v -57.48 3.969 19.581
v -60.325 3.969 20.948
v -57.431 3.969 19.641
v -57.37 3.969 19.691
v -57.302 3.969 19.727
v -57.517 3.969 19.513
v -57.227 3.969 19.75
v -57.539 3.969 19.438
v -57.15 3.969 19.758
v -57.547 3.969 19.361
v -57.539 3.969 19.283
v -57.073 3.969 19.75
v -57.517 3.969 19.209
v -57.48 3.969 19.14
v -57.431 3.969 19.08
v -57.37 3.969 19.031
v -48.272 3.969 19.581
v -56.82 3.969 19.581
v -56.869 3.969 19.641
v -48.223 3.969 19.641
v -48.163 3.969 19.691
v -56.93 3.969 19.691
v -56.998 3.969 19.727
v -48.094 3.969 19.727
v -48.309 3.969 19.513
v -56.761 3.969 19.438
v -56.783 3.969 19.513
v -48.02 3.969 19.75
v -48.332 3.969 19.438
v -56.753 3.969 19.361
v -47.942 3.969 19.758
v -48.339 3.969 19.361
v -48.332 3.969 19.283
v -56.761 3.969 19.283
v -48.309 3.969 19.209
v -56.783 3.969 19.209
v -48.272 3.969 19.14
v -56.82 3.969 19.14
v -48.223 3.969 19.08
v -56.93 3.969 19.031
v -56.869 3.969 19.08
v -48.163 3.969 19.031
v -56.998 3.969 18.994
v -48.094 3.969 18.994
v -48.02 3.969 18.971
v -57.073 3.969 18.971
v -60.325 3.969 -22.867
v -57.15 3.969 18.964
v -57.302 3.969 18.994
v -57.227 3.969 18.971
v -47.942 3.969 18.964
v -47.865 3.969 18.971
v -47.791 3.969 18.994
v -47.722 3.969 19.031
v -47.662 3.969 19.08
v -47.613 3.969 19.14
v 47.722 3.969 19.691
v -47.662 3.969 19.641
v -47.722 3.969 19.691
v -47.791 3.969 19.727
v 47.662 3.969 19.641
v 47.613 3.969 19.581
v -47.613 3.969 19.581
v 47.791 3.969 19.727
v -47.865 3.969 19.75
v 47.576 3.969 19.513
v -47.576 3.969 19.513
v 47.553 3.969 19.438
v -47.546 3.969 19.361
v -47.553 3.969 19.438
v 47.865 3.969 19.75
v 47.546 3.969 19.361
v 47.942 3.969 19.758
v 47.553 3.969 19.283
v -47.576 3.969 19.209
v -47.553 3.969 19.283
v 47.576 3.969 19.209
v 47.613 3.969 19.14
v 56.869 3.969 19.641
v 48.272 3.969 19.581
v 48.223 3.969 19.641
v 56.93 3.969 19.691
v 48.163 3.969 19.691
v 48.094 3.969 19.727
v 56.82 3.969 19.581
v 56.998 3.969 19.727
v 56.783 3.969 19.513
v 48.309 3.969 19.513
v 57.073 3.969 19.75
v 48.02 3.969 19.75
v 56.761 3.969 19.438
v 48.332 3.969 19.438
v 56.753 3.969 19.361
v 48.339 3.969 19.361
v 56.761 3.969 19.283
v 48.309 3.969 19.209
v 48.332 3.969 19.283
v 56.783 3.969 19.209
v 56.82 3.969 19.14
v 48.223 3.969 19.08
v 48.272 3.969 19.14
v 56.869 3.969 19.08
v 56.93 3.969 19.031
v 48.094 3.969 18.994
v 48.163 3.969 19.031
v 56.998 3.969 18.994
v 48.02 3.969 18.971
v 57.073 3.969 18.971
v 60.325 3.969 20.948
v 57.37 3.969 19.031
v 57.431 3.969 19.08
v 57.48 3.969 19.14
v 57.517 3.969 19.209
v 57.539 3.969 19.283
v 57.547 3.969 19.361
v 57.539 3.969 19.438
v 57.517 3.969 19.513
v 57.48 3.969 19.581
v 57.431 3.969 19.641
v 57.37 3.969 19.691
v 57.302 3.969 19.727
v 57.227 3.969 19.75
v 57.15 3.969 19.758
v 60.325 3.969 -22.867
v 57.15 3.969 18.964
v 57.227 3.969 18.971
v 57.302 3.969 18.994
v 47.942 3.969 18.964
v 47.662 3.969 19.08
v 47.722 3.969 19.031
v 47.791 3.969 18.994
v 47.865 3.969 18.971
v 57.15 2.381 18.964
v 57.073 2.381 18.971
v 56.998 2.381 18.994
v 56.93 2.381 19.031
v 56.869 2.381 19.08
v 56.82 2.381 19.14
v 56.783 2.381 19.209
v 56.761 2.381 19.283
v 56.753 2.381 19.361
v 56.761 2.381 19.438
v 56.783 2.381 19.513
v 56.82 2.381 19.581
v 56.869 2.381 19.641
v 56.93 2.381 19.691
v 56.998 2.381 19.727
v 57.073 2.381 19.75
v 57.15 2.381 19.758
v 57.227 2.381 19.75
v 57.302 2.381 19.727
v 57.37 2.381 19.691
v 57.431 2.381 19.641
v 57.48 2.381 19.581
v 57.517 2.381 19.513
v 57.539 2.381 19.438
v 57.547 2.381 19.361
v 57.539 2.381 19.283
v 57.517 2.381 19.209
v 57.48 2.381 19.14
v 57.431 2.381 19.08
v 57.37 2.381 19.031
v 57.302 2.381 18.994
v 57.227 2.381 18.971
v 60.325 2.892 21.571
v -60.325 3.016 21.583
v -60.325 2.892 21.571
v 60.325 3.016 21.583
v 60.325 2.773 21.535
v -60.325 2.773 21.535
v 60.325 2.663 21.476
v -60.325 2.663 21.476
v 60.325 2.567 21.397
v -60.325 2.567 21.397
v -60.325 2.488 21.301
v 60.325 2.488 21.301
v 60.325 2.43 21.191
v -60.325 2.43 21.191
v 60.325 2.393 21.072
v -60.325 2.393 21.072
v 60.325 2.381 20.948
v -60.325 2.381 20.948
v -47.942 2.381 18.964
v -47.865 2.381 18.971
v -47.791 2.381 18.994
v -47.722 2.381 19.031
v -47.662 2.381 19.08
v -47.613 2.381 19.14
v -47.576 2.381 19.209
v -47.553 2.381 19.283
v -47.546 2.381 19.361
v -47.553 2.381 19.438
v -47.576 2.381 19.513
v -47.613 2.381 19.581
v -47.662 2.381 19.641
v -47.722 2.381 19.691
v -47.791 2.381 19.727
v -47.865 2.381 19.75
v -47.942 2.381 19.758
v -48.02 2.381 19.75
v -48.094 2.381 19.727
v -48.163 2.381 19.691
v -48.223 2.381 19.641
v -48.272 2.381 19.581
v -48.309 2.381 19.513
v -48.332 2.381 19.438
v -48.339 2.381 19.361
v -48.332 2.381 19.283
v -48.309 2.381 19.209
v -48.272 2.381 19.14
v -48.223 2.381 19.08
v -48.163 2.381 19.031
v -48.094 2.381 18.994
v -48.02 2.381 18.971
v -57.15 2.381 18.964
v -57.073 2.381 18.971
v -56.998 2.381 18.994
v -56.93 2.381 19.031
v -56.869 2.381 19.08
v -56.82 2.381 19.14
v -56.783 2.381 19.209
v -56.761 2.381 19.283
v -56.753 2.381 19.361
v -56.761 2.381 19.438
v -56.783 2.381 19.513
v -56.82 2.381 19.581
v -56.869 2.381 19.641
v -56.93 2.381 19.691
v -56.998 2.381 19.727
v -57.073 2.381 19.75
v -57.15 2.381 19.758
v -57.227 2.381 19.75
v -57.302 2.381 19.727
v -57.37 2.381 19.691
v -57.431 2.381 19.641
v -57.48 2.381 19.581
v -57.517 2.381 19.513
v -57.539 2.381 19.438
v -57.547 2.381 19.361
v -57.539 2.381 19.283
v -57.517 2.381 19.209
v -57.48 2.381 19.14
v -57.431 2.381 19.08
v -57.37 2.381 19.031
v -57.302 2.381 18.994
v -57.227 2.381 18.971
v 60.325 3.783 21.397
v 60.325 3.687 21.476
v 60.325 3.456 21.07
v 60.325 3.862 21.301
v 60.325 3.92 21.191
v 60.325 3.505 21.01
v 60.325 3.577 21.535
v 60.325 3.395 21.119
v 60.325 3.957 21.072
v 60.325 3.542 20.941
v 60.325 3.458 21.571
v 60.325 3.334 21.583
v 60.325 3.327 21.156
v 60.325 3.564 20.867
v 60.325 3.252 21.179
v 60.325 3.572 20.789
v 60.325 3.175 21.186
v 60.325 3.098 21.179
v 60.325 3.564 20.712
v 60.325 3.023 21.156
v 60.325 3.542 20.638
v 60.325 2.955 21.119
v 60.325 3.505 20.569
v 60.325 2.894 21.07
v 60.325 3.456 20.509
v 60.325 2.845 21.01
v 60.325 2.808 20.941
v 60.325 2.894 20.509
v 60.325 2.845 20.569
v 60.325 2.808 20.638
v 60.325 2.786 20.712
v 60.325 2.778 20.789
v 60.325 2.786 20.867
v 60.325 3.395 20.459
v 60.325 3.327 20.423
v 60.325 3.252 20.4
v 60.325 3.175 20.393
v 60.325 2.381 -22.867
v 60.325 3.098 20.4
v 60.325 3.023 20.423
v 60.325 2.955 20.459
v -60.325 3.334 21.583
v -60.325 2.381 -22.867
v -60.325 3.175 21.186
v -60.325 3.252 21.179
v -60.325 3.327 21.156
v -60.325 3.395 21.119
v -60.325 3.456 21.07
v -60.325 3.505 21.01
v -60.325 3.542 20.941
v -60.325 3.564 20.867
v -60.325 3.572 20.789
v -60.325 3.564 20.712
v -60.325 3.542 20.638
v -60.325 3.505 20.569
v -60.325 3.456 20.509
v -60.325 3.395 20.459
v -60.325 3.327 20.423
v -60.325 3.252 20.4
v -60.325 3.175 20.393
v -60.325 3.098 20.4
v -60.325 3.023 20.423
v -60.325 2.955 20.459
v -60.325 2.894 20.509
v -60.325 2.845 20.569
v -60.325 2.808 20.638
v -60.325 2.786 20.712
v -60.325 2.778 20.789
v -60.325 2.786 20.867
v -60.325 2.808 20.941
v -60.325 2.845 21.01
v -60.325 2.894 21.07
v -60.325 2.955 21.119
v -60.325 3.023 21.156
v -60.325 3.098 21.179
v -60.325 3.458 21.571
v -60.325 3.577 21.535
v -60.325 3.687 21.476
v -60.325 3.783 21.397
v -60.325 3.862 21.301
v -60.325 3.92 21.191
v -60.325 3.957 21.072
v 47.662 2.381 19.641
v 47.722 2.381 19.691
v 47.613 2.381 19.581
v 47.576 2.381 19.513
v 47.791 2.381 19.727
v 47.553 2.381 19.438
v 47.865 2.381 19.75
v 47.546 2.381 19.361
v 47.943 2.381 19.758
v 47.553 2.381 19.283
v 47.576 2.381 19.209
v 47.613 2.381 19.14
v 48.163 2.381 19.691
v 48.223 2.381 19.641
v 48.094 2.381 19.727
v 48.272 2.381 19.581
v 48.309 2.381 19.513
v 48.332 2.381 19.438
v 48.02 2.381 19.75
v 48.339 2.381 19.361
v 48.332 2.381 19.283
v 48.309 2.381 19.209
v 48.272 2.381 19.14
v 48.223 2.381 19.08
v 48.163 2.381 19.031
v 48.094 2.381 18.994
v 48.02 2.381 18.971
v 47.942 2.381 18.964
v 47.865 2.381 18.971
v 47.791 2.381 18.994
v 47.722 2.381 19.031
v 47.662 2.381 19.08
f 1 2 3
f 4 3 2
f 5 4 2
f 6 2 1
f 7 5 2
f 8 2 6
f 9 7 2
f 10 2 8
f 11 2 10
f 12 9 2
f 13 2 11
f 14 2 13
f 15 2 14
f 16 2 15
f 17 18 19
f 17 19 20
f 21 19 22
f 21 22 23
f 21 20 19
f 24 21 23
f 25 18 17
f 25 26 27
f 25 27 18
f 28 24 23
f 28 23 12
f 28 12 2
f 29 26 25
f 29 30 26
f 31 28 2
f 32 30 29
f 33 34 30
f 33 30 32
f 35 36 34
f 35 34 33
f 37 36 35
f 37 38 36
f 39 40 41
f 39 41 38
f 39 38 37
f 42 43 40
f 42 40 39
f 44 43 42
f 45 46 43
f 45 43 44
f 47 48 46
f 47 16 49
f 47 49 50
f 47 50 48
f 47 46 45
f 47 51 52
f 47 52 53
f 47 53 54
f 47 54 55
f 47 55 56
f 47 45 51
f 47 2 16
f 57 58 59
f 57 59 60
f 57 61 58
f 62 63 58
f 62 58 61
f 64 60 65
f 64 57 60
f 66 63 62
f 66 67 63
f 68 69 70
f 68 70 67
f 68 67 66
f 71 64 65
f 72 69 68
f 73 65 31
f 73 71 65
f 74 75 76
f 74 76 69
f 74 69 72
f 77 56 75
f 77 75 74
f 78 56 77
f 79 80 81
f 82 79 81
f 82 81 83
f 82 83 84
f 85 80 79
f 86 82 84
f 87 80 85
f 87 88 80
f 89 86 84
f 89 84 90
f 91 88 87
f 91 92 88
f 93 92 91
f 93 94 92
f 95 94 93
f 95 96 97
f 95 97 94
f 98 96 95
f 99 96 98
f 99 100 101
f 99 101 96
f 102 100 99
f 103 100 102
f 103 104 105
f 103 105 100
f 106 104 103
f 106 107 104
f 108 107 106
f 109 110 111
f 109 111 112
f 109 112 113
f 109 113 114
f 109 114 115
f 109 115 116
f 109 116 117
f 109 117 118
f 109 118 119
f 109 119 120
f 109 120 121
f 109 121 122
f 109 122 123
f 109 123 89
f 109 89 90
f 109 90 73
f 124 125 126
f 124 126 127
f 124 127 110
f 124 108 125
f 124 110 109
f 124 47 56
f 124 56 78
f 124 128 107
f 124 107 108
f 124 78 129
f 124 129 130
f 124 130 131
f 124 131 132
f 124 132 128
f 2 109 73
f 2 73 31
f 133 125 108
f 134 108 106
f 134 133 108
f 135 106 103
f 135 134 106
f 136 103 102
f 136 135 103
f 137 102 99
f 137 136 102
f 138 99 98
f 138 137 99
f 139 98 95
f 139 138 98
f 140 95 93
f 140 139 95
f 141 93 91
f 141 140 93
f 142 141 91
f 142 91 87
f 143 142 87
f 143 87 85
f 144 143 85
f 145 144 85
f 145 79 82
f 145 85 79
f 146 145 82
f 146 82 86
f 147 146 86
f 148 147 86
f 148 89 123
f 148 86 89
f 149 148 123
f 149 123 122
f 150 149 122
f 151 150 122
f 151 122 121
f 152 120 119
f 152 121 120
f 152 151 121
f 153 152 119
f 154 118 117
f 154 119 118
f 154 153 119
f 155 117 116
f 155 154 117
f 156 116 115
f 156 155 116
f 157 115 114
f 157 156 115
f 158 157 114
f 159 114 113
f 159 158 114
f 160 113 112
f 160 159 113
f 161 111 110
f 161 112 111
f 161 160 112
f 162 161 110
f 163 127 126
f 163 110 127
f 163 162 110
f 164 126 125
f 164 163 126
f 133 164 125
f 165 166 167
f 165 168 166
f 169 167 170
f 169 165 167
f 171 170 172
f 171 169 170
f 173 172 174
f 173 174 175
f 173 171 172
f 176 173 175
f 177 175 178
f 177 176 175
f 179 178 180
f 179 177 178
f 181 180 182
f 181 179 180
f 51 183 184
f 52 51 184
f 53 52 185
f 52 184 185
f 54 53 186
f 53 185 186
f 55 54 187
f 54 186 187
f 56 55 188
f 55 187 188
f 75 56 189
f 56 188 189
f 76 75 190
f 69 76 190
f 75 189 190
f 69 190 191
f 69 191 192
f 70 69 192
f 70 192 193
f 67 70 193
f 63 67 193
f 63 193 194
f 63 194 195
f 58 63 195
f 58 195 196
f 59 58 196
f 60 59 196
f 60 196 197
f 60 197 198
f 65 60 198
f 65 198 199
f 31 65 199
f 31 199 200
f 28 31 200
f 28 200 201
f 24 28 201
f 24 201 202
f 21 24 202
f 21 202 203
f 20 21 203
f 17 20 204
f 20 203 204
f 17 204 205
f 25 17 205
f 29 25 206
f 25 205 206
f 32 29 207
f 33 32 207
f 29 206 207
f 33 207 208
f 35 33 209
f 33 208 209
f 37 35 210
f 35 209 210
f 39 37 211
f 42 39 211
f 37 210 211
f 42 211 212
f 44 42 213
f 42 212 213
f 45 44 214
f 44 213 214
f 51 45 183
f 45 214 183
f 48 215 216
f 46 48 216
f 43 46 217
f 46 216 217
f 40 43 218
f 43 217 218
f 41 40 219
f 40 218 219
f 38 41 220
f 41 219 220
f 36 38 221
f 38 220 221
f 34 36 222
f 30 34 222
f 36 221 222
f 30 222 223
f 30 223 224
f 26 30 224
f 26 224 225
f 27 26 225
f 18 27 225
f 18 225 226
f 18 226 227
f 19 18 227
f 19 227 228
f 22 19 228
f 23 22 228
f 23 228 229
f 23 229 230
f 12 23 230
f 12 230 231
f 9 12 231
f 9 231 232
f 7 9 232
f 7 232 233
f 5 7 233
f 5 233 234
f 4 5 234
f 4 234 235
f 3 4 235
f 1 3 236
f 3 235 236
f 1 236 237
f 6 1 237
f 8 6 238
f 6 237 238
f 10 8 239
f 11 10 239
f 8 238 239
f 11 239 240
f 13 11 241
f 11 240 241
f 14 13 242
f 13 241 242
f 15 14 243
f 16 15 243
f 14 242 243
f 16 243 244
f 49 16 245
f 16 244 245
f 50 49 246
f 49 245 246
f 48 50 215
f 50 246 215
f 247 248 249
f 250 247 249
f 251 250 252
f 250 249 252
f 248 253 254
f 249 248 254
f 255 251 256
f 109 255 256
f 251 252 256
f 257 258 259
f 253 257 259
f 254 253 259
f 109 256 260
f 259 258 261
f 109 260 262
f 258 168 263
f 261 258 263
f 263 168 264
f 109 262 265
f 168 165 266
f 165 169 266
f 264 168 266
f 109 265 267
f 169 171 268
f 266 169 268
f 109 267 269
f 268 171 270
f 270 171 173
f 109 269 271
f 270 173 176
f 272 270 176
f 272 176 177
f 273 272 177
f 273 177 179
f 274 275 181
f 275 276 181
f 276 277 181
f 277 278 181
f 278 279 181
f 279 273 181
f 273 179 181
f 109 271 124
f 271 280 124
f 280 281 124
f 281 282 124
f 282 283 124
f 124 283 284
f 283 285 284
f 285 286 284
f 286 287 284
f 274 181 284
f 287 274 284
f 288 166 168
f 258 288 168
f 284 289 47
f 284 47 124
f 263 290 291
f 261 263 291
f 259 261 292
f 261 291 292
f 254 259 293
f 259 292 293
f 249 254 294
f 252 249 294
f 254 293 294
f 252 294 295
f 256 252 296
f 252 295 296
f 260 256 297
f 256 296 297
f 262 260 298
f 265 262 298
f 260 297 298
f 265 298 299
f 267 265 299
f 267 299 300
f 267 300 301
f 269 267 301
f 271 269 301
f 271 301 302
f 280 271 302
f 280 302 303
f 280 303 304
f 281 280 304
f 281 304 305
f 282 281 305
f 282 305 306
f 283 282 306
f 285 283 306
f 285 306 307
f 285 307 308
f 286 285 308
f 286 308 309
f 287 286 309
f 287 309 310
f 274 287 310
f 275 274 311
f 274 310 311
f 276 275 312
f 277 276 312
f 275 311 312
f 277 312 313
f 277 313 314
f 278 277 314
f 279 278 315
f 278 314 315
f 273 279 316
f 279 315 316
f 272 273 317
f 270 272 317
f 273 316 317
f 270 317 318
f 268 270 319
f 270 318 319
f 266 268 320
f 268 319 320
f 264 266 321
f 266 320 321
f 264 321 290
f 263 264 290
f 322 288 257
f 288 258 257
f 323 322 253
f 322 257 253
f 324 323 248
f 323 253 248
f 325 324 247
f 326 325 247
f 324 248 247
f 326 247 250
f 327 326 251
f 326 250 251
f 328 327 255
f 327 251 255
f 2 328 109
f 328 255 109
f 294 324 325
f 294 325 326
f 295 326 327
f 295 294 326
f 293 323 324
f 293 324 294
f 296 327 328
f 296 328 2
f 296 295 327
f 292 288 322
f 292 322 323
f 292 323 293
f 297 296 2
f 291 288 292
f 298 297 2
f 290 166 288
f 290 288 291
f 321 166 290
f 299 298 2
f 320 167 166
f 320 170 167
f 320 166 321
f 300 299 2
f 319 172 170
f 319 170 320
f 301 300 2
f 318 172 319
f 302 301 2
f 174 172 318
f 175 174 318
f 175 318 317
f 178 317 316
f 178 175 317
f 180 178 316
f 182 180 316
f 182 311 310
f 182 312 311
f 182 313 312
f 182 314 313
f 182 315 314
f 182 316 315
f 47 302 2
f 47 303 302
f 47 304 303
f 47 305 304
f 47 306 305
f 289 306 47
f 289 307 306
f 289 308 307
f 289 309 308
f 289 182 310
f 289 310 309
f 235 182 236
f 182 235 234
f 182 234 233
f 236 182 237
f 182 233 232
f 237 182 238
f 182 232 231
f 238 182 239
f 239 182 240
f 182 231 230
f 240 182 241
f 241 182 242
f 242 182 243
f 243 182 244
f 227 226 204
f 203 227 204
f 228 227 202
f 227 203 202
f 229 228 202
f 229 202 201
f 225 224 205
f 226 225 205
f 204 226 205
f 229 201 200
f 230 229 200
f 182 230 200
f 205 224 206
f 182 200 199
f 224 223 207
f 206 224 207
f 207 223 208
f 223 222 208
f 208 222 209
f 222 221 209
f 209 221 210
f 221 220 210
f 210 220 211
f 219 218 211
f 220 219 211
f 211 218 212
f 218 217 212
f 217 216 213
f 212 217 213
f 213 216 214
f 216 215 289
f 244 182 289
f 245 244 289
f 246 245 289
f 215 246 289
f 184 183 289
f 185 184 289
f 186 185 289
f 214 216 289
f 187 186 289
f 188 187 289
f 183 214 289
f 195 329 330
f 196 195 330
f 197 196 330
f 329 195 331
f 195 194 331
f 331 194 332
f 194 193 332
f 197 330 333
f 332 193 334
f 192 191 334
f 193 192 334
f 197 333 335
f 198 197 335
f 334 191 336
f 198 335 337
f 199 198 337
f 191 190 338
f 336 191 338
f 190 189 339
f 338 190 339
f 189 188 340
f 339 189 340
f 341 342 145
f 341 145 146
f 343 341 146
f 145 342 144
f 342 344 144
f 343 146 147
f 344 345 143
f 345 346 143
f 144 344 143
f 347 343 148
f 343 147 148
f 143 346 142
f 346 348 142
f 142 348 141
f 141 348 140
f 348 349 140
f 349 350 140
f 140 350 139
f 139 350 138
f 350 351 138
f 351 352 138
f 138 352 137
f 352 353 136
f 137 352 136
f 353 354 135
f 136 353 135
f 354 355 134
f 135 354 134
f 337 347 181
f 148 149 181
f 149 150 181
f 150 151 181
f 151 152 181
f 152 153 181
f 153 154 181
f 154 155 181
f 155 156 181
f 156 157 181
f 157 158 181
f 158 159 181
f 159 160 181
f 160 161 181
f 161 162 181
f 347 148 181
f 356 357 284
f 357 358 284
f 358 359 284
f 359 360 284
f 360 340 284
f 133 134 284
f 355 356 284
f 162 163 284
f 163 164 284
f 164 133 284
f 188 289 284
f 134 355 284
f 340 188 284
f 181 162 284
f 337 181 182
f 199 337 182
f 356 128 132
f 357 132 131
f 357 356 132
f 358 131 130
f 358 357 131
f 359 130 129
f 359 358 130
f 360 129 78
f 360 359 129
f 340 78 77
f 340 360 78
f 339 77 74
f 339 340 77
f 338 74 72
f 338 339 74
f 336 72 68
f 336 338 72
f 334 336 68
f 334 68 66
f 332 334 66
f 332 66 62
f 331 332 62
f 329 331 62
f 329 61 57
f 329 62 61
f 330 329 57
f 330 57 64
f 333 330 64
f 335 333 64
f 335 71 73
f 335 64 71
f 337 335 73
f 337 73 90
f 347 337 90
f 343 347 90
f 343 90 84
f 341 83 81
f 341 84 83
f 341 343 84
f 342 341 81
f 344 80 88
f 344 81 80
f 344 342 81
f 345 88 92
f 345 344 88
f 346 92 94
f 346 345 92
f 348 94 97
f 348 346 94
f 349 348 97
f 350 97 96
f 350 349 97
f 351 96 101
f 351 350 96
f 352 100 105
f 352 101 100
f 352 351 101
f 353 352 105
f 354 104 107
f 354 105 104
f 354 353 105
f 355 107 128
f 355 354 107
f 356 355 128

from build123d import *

# Parameters (mm, degrees)
SKETCH1_W           = 482.6
SKETCH1_H           = 177.8
BOSS_EXTRUDE1_DEPTH = 6.35
SKETCH2_R           = 1.5875
CUT_EXTRUDE1_DEPTH  = 491.760932125
FILLET1_R           = 2.54
SKETCH4_R           = 1.5875
CUT_EXTRUDE3_DEPTH  = 258.233789577
SCALE1_SCALE        = 0.25


with BuildPart() as part:
    # Sketch1 → Boss-Extrude1 (new body)
    with BuildSketch(Plane(origin=(0, 0, 0), x_dir=(1, 0, 0), z_dir=(0, 1, 0))):
        Rectangle(SKETCH1_W, SKETCH1_H)
    extrude(amount=BOSS_EXTRUDE1_DEPTH)

    # Sketch2 → Cut-Extrude1 (cut, through all)
    with BuildSketch(Plane.ZY.offset(241.3)):
        with Locations((85.725, 3.175)):
            Circle(SKETCH2_R)
    extrude(amount=-CUT_EXTRUDE1_DEPTH, mode=Mode.SUBTRACT)

    # Fillet1
    fillet1_edges = [part.edges().sort_by_distance(p)[0] for p in [
        (0, 6.35, 88.9),
        (0, 0, 88.9),
    ]]
    fillet(fillet1_edges, radius=FILLET1_R)

    # Sketch4 → Cut-Extrude3 (cut, through all)
    with BuildSketch(Plane.XZ):
        with Locations(Location((-191.77, 80.01, 0), (0, 0, 270))):
            Circle(SKETCH4_R)
        with Locations(Location((-228.6, 80.01, 0), (0, 0, 270))):
            Circle(SKETCH4_R)
    cut_extrude3 = extrude(amount=-CUT_EXTRUDE3_DEPTH, mode=Mode.SUBTRACT)

    # Mirror1: Cut-Extrude3 across plane
    add(cut_extrude3.mirror(Plane(origin=(0, 0, 0), x_dir=(0, 0, 1), z_dir=(1, 0, 0))), mode=Mode.SUBTRACT)


with BuildPart() as part_1:
    # Scale1: scaled about (0, 3.175, -0.855734496)
    add(part.part.scale(SCALE1_SCALE).moved(Location((0, 2.38125, -0.641800872))))


solid = part_1.part
